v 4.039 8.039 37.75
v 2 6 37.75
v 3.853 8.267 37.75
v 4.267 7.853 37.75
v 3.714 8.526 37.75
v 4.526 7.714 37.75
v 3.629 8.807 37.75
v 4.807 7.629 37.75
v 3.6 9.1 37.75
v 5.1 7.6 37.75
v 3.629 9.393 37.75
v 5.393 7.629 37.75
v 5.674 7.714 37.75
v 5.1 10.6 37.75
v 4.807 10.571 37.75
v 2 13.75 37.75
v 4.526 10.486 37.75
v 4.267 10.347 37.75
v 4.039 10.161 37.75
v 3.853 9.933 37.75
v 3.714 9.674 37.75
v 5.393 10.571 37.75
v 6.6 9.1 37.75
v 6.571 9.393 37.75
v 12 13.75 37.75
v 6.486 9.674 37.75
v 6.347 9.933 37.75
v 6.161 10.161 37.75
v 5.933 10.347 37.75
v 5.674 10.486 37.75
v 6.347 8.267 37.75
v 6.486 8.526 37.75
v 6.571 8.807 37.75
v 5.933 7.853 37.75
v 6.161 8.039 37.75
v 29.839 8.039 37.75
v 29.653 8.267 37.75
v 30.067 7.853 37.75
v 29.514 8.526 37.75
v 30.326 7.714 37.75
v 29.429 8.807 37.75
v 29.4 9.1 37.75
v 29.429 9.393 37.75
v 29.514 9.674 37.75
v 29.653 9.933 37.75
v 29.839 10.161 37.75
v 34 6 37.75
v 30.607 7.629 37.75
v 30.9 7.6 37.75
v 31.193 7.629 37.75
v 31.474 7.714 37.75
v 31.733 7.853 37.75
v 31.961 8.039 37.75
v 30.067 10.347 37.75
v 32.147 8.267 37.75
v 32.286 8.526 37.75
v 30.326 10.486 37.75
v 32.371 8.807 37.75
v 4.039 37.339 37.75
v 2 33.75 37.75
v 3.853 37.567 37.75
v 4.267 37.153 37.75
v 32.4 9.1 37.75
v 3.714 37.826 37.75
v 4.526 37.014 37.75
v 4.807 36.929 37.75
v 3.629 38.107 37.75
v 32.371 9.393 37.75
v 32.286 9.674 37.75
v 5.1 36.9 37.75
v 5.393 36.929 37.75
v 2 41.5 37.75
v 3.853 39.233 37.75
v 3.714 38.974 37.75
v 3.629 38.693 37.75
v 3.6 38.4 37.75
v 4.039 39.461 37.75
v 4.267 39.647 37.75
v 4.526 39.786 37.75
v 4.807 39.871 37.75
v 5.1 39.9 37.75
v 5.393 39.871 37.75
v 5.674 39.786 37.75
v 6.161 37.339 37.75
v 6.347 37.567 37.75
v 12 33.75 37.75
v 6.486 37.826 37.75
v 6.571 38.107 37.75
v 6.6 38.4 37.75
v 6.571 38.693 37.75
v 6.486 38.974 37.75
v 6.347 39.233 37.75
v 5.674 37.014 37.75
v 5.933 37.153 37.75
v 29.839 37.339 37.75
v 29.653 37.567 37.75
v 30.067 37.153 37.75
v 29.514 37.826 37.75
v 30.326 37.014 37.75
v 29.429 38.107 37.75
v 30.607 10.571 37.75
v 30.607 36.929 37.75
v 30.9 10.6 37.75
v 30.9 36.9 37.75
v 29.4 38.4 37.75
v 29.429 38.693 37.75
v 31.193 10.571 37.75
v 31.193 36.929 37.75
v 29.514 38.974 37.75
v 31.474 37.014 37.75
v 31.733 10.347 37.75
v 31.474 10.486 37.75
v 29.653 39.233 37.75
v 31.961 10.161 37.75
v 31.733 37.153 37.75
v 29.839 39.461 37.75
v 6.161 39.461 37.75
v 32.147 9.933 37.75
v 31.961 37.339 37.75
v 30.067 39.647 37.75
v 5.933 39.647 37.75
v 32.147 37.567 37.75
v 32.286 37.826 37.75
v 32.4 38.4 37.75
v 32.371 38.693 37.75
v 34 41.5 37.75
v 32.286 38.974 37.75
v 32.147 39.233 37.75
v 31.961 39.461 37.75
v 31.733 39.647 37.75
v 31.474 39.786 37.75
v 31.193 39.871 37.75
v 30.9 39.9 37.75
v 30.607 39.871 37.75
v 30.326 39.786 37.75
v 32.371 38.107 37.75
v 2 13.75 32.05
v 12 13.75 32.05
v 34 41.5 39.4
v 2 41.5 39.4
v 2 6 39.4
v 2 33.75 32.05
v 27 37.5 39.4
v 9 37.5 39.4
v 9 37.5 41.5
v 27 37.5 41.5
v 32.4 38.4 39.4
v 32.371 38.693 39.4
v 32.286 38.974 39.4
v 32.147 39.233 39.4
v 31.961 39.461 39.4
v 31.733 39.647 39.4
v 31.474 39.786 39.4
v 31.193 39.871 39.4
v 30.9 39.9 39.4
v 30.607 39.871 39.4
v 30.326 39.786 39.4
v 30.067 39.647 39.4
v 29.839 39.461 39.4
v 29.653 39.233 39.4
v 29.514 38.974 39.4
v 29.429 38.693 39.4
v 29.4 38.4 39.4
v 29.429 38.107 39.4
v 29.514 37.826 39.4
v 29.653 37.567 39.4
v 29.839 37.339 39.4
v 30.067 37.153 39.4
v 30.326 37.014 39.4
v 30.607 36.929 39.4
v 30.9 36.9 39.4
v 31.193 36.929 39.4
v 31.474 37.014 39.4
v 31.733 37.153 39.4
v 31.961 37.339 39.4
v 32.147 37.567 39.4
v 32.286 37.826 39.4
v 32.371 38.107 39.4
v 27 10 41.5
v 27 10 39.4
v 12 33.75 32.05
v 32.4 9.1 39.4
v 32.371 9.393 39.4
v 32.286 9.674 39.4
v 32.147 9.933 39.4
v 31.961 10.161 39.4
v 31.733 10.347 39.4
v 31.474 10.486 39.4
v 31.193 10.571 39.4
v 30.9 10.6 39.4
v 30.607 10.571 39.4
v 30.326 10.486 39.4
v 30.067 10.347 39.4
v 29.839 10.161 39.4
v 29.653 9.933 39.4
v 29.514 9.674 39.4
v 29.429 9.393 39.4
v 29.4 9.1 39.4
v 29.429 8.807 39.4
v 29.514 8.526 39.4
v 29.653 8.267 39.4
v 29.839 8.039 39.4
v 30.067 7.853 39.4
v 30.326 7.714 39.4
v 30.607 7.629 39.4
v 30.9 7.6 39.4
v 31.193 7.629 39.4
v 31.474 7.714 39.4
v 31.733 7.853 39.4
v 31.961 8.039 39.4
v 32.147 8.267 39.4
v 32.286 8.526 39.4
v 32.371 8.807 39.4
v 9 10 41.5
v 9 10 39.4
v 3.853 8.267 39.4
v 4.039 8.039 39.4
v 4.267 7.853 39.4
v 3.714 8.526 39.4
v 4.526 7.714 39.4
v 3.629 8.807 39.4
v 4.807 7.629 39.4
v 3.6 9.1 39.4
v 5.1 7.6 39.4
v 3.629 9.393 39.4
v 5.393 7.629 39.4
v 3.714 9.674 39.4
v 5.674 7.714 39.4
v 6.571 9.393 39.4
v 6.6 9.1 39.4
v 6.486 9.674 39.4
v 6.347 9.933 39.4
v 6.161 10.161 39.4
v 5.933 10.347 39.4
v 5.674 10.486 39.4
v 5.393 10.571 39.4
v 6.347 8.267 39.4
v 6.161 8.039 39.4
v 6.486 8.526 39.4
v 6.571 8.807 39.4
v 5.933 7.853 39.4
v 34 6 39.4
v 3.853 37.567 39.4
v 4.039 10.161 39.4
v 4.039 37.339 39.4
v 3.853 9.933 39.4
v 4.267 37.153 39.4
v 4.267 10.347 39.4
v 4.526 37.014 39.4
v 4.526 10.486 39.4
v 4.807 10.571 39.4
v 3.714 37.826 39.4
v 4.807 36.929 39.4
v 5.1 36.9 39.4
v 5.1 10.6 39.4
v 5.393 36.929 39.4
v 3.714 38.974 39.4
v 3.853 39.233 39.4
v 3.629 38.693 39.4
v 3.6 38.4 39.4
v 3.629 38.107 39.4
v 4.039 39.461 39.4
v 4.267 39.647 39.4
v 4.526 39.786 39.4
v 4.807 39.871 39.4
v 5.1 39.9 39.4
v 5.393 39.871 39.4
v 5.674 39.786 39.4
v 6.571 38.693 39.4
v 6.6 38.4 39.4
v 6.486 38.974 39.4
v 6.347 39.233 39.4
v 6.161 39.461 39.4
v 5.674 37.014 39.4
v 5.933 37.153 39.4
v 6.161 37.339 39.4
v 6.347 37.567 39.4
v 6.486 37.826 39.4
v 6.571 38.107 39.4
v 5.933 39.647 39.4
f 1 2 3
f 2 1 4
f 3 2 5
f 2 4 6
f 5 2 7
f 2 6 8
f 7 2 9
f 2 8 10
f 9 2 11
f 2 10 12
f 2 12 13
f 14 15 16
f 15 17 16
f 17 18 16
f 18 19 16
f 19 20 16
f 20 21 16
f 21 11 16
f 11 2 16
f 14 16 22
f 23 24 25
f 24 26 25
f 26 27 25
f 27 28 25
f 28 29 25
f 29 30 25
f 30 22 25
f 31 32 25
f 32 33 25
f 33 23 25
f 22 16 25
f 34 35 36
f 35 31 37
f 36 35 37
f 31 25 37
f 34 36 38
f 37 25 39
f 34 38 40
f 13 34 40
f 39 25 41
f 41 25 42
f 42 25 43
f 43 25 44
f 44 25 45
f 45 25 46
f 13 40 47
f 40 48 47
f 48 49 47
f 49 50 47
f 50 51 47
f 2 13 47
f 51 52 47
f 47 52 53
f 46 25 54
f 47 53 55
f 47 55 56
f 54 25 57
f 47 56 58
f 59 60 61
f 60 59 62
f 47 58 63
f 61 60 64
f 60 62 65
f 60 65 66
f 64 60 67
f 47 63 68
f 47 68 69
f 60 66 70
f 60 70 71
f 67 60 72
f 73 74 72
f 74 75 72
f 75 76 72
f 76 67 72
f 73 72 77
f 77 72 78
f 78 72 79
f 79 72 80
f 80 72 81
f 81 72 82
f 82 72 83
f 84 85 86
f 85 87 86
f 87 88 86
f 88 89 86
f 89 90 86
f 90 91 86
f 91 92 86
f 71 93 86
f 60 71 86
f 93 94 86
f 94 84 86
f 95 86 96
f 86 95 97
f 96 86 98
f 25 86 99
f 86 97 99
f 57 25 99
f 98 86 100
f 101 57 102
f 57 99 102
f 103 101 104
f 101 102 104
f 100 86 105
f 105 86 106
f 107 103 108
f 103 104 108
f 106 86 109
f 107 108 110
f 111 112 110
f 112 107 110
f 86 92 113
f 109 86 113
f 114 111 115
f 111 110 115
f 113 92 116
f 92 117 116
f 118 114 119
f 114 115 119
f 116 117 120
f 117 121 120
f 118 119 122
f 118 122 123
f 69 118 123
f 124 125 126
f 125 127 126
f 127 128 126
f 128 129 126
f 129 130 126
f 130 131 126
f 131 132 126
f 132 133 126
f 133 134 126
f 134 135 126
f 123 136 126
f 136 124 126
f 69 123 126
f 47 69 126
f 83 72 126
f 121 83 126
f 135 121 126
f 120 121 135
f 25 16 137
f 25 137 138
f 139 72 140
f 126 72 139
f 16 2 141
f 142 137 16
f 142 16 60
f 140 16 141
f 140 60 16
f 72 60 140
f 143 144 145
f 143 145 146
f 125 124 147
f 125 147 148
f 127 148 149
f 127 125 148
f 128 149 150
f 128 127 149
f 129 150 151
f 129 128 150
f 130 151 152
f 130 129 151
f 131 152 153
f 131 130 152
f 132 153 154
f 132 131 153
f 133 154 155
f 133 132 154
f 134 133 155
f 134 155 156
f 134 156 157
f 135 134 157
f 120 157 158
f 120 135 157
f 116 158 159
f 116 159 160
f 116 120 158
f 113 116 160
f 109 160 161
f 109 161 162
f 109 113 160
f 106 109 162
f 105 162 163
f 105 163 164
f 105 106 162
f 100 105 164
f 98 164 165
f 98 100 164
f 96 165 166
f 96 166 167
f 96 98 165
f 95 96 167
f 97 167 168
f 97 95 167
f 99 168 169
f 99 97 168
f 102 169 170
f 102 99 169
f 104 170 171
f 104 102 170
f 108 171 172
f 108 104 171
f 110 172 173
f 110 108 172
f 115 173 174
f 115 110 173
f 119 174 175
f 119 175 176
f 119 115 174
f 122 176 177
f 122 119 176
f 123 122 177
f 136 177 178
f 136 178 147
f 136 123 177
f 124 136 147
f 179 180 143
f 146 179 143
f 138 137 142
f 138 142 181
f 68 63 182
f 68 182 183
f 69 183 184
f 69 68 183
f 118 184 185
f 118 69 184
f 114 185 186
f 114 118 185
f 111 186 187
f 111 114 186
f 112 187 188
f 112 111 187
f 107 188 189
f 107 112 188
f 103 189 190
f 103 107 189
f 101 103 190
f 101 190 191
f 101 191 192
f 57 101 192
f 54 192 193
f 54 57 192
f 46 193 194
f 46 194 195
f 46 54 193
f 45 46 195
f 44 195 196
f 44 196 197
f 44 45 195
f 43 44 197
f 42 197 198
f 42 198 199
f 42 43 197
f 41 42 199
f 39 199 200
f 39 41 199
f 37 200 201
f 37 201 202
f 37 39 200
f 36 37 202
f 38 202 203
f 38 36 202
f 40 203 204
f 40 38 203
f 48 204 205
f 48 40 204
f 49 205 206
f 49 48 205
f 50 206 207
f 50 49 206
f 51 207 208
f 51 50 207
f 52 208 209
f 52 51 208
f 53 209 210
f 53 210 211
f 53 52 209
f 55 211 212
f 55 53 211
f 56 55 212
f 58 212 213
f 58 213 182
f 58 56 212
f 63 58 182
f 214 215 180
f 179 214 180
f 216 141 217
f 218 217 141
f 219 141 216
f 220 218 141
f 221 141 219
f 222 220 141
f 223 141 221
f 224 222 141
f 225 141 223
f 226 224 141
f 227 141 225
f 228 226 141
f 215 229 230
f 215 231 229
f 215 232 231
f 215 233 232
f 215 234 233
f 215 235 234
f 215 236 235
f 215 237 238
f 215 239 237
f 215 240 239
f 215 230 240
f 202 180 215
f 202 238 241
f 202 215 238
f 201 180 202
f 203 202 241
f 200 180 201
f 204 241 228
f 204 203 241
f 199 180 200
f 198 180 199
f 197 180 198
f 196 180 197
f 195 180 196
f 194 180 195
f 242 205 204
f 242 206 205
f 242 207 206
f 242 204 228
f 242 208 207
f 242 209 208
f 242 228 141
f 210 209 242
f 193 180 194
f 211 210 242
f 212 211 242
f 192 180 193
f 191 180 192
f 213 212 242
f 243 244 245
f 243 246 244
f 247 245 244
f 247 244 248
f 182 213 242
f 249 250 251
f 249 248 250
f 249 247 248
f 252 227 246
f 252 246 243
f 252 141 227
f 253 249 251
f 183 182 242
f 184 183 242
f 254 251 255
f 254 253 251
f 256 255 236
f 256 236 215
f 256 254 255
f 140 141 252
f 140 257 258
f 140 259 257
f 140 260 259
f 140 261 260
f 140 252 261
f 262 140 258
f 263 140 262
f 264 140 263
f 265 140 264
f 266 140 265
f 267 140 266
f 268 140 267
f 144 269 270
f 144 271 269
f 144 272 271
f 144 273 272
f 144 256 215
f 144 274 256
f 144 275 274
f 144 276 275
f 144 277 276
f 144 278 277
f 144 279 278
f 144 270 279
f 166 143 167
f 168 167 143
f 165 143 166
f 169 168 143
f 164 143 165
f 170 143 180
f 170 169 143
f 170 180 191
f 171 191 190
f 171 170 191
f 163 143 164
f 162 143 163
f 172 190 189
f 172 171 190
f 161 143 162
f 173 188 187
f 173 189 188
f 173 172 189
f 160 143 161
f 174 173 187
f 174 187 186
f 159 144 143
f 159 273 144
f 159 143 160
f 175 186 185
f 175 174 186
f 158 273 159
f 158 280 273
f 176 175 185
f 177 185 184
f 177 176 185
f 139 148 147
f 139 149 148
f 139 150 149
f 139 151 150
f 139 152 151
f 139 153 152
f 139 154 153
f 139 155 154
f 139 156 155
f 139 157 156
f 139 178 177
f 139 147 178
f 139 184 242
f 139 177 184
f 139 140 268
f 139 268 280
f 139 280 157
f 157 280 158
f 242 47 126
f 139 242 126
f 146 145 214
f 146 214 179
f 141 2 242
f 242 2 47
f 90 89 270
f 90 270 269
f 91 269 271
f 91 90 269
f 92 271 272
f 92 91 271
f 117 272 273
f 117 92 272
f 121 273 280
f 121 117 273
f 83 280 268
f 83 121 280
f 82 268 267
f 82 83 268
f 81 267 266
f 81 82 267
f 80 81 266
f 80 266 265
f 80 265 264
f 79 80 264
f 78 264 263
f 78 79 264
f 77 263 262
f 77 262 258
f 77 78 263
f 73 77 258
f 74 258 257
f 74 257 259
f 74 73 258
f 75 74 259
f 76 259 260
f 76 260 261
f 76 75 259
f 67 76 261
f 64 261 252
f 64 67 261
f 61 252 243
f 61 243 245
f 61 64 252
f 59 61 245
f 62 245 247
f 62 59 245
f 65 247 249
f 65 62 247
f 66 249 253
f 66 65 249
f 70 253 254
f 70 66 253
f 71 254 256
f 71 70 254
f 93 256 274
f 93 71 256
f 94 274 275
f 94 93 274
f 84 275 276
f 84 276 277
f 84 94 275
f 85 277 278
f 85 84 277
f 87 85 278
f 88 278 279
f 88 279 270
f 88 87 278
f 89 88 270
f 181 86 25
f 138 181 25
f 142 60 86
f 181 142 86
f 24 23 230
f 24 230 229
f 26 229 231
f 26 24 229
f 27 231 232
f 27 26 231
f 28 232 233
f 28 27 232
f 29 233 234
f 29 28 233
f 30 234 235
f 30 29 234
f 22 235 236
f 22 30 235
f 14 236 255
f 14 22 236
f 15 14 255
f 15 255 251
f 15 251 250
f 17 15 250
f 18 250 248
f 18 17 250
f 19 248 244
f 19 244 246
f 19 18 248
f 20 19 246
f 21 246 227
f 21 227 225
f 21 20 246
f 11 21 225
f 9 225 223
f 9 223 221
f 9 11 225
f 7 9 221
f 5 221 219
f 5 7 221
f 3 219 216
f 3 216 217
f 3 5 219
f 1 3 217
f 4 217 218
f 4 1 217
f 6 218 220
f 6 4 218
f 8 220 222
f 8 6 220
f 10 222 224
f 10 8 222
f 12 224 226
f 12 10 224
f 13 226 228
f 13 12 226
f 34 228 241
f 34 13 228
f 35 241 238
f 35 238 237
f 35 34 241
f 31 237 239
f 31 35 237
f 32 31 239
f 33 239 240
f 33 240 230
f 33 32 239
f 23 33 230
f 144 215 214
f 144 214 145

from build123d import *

# Parameters (mm, degrees)
SKETCH042_W  = 32
SKETCH042_H  = 35.5
SKETCH042_R  = 1.5
PAD025_DEPTH = 1.65
SKETCH043_W  = 18
SKETCH043_H  = 27.5
PAD026_DEPTH = 2.1
SKETCH044_W  = 10
SKETCH044_H  = 20
PAD027_DEPTH = 5.7


with BuildPart() as part:
    # Sketch042 → Pad025 (new body)
    with BuildSketch(Plane.XY):
        with Locations((16, 17.75)):
            Rectangle(SKETCH042_W, SKETCH042_H)
        with Locations((3.1, 32.4)):
            Circle(SKETCH042_R, mode=Mode.SUBTRACT)
        with Locations((28.9, 32.4)):
            Circle(SKETCH042_R, mode=Mode.SUBTRACT)
        with Locations((28.9, 3.1)):
            Circle(SKETCH042_R, mode=Mode.SUBTRACT)
        with Locations((3.1, 3.1)):
            Circle(SKETCH042_R, mode=Mode.SUBTRACT)
    extrude(amount=PAD025_DEPTH)

    # Sketch043 (on Face10 of Pad025) → Pad026 (join)
    with BuildSketch(Plane.XY.offset(1.65)):
        with Locations((16, 17.75)):
            Rectangle(SKETCH043_W, SKETCH043_H)
    extrude(amount=PAD026_DEPTH)

    # Sketch044 (on Face4 of Pad026) → Pad027 (join)
    with BuildSketch(Plane(origin=(0, 0, 0), x_dir=(1, 0, 0), z_dir=(0, 0, -1))):
        with Locations((5, -17.75)):
            Rectangle(SKETCH044_W, SKETCH044_H)
    extrude(amount=PAD027_DEPTH)


with BuildPart() as part_1:
    # Body006 placement: moved
    add(part.part.moved(Location((2, 6, 37.75))))


solid = part_1.part
